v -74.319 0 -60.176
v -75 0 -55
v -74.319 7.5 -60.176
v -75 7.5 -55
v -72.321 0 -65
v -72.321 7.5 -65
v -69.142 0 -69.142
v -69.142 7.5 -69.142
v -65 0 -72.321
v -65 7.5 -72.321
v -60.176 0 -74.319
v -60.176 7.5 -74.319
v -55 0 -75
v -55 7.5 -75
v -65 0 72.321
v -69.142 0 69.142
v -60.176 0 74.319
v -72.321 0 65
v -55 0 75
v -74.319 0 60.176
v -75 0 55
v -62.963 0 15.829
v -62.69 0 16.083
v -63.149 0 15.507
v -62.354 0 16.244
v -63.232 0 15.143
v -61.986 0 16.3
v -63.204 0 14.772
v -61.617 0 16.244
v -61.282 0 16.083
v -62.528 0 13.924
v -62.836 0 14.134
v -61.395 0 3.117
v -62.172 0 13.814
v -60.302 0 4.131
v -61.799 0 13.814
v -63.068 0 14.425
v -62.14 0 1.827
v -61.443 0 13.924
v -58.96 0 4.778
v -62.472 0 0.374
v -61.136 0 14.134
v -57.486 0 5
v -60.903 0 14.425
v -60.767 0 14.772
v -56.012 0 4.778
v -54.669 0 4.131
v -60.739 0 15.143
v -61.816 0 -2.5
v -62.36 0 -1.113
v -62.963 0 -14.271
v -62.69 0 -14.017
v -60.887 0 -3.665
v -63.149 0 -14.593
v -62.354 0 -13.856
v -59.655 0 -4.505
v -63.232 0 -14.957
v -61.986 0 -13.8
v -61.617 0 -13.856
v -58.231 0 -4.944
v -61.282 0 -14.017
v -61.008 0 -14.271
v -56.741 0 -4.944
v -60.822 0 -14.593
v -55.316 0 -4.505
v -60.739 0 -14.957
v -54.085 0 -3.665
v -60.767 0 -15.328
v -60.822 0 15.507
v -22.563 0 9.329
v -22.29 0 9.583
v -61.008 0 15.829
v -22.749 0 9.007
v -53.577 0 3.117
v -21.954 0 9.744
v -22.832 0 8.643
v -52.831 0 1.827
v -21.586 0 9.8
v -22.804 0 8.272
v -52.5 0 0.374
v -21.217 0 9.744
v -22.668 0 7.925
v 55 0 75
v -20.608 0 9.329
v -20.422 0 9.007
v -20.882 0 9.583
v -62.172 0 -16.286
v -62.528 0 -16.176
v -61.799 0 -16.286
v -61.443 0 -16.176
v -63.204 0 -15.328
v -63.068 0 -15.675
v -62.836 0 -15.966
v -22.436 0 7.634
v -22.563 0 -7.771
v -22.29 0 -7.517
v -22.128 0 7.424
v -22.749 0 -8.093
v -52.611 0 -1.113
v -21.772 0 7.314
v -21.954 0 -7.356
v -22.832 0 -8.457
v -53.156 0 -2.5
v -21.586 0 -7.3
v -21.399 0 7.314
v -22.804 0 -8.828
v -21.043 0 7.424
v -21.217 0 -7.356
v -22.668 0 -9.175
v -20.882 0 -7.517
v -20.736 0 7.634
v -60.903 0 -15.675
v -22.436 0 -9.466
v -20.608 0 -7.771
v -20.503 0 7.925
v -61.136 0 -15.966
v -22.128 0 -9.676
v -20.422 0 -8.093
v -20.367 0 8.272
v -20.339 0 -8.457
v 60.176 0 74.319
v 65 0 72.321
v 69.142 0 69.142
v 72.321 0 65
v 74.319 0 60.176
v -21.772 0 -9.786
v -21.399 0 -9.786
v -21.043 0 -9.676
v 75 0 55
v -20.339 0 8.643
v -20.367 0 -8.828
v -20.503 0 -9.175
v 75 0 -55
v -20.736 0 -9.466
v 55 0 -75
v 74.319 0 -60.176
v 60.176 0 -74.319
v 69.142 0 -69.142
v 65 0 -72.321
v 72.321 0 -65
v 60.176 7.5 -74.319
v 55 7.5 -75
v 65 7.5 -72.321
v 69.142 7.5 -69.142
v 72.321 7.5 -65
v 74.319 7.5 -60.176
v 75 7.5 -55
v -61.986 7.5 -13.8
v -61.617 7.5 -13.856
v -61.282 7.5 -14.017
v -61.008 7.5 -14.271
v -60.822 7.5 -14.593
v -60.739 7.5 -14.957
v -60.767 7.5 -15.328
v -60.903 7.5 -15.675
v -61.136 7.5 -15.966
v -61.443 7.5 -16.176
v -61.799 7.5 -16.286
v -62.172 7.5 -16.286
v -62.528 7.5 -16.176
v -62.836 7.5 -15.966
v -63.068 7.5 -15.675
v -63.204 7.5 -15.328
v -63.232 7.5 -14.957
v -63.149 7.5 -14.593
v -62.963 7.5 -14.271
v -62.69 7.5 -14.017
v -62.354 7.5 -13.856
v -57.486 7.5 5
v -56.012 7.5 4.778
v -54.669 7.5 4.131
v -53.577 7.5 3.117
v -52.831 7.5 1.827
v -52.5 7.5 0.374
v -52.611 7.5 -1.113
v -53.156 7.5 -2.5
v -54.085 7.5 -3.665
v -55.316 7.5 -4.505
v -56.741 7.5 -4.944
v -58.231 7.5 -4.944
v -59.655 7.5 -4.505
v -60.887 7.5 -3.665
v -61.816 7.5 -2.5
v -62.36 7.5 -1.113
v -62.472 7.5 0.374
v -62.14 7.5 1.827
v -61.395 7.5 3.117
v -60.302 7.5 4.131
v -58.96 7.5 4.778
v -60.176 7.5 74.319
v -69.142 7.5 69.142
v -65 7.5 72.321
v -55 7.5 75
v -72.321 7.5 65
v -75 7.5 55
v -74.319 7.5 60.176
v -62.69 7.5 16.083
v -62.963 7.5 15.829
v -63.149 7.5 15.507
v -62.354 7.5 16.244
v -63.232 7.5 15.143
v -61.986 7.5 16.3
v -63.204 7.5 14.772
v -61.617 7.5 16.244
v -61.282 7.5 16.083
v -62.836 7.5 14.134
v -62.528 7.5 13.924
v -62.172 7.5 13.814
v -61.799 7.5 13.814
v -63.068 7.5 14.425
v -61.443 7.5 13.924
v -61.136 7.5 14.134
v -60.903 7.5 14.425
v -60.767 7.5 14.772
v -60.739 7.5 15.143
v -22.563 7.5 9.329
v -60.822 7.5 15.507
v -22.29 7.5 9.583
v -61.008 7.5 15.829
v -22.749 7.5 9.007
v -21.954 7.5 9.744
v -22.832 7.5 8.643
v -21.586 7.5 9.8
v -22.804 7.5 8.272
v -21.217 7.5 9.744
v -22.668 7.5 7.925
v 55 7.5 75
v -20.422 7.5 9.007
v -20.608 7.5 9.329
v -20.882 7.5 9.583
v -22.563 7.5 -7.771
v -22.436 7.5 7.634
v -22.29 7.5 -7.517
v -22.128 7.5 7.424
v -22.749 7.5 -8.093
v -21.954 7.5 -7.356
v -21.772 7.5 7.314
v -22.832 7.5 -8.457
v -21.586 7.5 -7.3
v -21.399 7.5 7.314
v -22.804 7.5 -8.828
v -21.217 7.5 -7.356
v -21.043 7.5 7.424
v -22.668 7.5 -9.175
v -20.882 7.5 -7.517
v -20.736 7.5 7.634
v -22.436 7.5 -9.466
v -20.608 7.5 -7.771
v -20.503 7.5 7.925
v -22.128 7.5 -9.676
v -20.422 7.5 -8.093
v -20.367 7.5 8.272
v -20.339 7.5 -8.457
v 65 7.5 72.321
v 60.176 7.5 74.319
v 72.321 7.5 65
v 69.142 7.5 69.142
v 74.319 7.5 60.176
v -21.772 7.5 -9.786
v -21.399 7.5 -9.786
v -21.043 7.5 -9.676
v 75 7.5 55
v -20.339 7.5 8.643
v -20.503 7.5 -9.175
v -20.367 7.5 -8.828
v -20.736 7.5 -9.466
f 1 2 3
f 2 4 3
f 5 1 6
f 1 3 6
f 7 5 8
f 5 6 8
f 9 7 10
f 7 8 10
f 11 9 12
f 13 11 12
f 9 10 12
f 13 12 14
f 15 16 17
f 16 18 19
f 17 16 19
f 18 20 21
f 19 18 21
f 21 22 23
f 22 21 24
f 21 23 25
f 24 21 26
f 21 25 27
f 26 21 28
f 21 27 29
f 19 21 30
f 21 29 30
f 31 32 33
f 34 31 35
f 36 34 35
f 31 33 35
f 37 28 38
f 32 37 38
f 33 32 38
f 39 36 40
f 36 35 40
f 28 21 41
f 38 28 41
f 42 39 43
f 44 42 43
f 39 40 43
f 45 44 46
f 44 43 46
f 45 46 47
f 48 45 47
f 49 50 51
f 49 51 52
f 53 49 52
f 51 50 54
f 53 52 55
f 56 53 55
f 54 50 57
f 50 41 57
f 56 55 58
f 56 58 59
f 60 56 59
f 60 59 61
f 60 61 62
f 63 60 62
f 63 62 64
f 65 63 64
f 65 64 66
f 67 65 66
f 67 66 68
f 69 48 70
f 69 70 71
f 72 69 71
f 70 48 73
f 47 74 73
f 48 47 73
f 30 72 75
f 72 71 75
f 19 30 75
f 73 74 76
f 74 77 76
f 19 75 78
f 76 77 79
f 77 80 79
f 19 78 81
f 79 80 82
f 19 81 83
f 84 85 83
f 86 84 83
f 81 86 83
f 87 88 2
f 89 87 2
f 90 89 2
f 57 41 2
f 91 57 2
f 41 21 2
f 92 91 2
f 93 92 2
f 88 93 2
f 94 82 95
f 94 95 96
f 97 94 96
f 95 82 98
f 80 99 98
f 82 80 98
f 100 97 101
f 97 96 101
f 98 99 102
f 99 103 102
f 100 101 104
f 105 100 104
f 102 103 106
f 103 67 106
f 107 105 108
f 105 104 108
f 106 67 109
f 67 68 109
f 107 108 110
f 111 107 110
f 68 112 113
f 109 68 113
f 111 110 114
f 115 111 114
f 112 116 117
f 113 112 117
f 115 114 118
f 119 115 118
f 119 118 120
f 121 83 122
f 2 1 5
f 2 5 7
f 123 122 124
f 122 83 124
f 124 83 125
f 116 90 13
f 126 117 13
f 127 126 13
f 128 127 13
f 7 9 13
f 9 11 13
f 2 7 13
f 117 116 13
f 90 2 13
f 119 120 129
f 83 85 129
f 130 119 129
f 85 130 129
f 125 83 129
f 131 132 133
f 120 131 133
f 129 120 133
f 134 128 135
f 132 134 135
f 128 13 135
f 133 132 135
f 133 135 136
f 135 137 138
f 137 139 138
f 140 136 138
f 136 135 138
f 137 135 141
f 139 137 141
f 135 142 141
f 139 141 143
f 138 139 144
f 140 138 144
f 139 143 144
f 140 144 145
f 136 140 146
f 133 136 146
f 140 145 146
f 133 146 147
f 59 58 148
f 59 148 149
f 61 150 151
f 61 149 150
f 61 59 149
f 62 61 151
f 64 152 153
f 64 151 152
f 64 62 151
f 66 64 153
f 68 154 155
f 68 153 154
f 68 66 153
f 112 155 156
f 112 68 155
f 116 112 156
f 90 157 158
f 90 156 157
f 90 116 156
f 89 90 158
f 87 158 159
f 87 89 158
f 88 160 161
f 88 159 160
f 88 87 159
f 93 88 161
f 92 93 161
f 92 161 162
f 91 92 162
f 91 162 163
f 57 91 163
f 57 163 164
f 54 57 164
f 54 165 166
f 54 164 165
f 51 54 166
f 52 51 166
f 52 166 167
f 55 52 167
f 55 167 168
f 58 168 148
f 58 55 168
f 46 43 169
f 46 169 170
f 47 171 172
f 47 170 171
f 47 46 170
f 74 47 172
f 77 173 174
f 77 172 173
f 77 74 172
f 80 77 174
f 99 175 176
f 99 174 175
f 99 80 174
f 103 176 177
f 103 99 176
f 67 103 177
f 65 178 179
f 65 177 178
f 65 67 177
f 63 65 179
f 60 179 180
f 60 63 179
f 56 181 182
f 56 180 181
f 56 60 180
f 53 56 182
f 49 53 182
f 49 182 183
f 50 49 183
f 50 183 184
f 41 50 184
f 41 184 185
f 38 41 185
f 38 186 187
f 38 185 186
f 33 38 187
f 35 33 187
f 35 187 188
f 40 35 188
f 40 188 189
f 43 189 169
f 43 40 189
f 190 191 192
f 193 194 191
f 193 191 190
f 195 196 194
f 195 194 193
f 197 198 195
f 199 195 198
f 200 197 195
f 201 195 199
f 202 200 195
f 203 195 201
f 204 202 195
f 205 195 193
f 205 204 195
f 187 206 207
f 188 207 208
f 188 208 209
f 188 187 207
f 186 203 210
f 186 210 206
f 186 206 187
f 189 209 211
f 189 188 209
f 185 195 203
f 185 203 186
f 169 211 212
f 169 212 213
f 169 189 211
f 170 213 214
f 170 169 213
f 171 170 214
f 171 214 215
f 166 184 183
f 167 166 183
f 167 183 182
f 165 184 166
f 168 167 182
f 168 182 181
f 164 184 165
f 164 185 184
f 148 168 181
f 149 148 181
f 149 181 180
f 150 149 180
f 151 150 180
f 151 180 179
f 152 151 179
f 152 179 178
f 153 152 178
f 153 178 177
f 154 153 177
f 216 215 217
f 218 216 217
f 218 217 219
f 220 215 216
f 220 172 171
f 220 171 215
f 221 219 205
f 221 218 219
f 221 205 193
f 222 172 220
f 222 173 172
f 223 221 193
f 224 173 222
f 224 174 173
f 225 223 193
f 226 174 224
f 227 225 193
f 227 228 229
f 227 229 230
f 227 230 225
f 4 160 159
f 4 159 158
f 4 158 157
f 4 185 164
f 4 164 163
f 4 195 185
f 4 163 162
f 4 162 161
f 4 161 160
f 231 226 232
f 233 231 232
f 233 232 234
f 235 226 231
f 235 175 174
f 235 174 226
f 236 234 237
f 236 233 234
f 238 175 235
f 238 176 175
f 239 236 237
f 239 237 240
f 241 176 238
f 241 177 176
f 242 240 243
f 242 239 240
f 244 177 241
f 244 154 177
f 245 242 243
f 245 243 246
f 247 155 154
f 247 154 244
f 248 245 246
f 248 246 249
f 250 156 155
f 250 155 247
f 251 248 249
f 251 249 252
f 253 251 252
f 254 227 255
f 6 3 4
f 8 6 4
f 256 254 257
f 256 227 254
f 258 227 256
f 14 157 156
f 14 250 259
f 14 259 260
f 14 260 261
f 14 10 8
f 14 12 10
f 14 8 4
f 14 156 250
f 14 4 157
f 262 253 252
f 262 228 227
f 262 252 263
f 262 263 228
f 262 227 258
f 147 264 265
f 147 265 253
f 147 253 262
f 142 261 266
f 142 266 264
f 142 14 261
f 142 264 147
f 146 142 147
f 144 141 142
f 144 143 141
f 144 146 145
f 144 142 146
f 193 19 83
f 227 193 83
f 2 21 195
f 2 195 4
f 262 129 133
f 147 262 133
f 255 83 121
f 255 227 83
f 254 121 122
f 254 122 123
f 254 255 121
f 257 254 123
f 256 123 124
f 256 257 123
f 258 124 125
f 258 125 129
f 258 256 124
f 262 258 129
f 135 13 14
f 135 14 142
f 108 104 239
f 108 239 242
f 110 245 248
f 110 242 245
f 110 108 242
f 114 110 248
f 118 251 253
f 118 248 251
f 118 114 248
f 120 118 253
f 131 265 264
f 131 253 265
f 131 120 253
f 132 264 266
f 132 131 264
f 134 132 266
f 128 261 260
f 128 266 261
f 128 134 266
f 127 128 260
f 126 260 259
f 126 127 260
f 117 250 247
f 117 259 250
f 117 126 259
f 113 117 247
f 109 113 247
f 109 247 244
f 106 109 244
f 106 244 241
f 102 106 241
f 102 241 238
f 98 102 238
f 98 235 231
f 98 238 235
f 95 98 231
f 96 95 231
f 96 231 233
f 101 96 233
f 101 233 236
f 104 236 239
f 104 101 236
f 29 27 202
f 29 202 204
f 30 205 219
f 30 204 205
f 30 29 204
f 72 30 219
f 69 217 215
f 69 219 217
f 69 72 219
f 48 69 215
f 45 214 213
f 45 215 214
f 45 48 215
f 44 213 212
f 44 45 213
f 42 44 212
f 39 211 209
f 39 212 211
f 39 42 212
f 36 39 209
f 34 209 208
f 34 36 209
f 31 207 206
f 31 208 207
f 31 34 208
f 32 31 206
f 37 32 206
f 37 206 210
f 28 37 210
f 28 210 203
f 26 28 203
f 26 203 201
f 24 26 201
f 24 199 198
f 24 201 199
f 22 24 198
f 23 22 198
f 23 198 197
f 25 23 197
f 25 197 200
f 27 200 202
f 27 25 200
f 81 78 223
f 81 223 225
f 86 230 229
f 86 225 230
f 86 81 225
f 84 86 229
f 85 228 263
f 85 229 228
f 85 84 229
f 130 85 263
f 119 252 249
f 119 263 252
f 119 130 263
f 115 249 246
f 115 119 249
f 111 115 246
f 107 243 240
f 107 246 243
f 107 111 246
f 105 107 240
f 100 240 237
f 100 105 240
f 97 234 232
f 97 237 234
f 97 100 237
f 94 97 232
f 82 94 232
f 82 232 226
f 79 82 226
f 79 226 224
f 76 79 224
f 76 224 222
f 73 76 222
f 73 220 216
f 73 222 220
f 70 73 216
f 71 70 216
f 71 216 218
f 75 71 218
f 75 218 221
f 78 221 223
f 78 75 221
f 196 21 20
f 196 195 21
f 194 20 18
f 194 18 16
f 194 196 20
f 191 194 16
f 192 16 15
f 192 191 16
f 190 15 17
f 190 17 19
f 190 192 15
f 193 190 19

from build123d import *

# Parameters (mm, degrees)
SKETCH1_W               = 150
SKETCH1_H               = 150
BOSS_EXTRUDE1_DEPTH     = 7.5
CUT_EXTRUDE1_DEPTH      = 107.330851591
CUT_EXTRUDE1_DEPTH_BACK = 107.330851591
SKETCH2_R               = 1.25
SKETCH2_R_2             = 5
FILLET1_R               = 20


with BuildPart() as part:
    # Sketch1 → Boss-Extrude1 (new body)
    with BuildSketch(Plane(origin=(0, 0, 0), x_dir=(1, 0, 0), z_dir=(0, 1, 0))):
        Rectangle(SKETCH1_W, SKETCH1_H)
    extrude(amount=BOSS_EXTRUDE1_DEPTH)

    # Sketch2 → Cut-Extrude1 (cut, two sides: drawn at the far end of the back side and taken through both)
    with BuildSketch(Plane(origin=(0, 7.5, 0), x_dir=(1, 0, 0), z_dir=(0, 1, 0)).offset(-CUT_EXTRUDE1_DEPTH_BACK)):
        with Locations(Location((-61.985746634, -15.05, 0), (0, 0, 270))):
            Circle(SKETCH2_R)
        with Locations(Location((-61.985746634, 15.05, 0), (0, 0, 270))):
            Circle(SKETCH2_R)
        with Locations(Location((-21.585746634, 8.55, 0), (0, 0, 270))):
            Circle(SKETCH2_R)
        with Locations(Location((-21.585746634, -8.55, 0), (0, 0, 270))):
            Circle(SKETCH2_R)
        with Locations(Location((-57.485746634, 0, 0), (0, 0, 270))):
            Circle(SKETCH2_R_2)
    extrude(amount=CUT_EXTRUDE1_DEPTH + CUT_EXTRUDE1_DEPTH_BACK, mode=Mode.SUBTRACT)

    # Fillet1
    fillet1_edges = [part.edges().sort_by_distance(p)[0] for p in [
        (-75, 3.75, -75),
        (75, 3.75, -75),
        (75, 3.75, 75),
        (-75, 3.75, 75),
    ]]
    fillet(fillet1_edges, radius=FILLET1_R)


solid = part.part
